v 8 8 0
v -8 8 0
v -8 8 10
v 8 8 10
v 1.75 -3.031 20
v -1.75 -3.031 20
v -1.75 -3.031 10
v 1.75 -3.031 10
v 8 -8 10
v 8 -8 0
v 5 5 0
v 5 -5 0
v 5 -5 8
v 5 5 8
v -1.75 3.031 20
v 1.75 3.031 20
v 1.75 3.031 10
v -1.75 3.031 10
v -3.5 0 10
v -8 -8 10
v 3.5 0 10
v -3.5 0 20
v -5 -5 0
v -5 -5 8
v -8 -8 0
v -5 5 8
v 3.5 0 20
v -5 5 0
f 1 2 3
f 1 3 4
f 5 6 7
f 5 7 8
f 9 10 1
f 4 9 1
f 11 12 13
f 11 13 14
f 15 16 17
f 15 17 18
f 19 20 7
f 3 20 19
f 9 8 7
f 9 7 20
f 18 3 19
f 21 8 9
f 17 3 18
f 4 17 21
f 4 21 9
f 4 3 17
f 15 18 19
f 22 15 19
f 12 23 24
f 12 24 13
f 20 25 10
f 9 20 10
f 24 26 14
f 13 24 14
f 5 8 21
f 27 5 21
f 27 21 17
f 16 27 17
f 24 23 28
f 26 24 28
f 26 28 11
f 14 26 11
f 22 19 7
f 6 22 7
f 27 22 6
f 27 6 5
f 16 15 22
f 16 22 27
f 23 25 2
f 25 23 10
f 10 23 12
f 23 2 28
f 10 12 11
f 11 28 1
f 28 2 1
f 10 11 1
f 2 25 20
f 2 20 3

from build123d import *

# Parameters (mm, degrees)
BOX001_W      = 10
BOX001_H      = 10
BOX001_DEPTH  = 8
EXTRUDE_DEPTH = 10
BOX_W         = 16
BOX_H         = 16
BOX_DEPTH     = 10


with BuildPart() as cube001:
    # Box001 → Box001 (new body)
    with BuildSketch(Plane(origin=(-5, -5, 0), x_dir=(1, 0, 0), z_dir=(0, 0, 1))):
        with Locations((5, 5)):
            Rectangle(BOX001_W, BOX001_H)
    extrude(amount=BOX001_DEPTH)


with BuildPart() as extrude_body:
    # Sketch → Extrude (new body)
    with BuildSketch(Plane.XY):
        Polygon((-3.5, 0), (-1.75, -3.031089), (1.75, -3.031089), (3.5, 0), (1.75, 3.031089), (-1.75, 3.031089), align=None)
    extrude(amount=EXTRUDE_DEPTH)


with BuildPart() as extrude_body_1:
    # Extrude placement: moved
    add(extrude_body.part.moved(Location((0, 0, 10))))


with BuildPart() as cut:
    # Box → Box (new body)
    with BuildSketch(Plane(origin=(-8, -8, 0), x_dir=(1, 0, 0), z_dir=(0, 0, 1))):
        with Locations((8, 8)):
            Rectangle(BOX_W, BOX_H)
    extrude(amount=BOX_DEPTH)

    # Fusion: union Extrude body
    add(extrude_body_1.part)

    # Cut: cut Cube001
    add(cube001.part, mode=Mode.SUBTRACT)


solid = cut.part
